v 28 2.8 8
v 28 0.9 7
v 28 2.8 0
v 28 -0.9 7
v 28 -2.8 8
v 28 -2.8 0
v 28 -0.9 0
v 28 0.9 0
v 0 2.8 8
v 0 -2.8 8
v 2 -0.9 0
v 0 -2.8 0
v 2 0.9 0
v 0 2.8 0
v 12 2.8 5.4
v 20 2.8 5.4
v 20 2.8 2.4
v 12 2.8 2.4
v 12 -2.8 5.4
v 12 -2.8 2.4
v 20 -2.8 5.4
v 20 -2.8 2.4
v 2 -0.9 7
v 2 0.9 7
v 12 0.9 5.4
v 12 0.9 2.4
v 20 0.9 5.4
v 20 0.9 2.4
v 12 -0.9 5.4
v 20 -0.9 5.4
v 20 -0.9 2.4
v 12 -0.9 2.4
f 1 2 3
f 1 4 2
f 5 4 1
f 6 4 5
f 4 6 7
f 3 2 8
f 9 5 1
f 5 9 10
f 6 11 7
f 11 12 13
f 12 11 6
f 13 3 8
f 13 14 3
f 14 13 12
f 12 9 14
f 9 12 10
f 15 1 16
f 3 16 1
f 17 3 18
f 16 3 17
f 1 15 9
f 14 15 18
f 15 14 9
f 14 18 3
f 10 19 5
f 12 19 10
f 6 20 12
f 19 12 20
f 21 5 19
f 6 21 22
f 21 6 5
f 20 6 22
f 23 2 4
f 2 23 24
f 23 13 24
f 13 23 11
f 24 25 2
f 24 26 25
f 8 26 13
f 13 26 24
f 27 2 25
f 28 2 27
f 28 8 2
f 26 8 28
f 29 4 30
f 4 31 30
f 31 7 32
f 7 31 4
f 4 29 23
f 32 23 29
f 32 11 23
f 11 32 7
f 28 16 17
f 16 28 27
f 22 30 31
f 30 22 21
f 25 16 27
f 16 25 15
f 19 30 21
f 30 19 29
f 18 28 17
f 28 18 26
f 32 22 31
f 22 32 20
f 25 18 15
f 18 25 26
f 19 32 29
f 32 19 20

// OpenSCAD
difference () {
    translate ([0,-2.8,0]) {
   cube([28,5.6,8]); //main body
    }
       translate ([2.0,-0.9,-1]) {
           cube([36,1.8,8]); //internal hollow
       }
       translate ([12,-4,2.4])  {
           cube([8,8,3.0]); // screw slot
       }

}
